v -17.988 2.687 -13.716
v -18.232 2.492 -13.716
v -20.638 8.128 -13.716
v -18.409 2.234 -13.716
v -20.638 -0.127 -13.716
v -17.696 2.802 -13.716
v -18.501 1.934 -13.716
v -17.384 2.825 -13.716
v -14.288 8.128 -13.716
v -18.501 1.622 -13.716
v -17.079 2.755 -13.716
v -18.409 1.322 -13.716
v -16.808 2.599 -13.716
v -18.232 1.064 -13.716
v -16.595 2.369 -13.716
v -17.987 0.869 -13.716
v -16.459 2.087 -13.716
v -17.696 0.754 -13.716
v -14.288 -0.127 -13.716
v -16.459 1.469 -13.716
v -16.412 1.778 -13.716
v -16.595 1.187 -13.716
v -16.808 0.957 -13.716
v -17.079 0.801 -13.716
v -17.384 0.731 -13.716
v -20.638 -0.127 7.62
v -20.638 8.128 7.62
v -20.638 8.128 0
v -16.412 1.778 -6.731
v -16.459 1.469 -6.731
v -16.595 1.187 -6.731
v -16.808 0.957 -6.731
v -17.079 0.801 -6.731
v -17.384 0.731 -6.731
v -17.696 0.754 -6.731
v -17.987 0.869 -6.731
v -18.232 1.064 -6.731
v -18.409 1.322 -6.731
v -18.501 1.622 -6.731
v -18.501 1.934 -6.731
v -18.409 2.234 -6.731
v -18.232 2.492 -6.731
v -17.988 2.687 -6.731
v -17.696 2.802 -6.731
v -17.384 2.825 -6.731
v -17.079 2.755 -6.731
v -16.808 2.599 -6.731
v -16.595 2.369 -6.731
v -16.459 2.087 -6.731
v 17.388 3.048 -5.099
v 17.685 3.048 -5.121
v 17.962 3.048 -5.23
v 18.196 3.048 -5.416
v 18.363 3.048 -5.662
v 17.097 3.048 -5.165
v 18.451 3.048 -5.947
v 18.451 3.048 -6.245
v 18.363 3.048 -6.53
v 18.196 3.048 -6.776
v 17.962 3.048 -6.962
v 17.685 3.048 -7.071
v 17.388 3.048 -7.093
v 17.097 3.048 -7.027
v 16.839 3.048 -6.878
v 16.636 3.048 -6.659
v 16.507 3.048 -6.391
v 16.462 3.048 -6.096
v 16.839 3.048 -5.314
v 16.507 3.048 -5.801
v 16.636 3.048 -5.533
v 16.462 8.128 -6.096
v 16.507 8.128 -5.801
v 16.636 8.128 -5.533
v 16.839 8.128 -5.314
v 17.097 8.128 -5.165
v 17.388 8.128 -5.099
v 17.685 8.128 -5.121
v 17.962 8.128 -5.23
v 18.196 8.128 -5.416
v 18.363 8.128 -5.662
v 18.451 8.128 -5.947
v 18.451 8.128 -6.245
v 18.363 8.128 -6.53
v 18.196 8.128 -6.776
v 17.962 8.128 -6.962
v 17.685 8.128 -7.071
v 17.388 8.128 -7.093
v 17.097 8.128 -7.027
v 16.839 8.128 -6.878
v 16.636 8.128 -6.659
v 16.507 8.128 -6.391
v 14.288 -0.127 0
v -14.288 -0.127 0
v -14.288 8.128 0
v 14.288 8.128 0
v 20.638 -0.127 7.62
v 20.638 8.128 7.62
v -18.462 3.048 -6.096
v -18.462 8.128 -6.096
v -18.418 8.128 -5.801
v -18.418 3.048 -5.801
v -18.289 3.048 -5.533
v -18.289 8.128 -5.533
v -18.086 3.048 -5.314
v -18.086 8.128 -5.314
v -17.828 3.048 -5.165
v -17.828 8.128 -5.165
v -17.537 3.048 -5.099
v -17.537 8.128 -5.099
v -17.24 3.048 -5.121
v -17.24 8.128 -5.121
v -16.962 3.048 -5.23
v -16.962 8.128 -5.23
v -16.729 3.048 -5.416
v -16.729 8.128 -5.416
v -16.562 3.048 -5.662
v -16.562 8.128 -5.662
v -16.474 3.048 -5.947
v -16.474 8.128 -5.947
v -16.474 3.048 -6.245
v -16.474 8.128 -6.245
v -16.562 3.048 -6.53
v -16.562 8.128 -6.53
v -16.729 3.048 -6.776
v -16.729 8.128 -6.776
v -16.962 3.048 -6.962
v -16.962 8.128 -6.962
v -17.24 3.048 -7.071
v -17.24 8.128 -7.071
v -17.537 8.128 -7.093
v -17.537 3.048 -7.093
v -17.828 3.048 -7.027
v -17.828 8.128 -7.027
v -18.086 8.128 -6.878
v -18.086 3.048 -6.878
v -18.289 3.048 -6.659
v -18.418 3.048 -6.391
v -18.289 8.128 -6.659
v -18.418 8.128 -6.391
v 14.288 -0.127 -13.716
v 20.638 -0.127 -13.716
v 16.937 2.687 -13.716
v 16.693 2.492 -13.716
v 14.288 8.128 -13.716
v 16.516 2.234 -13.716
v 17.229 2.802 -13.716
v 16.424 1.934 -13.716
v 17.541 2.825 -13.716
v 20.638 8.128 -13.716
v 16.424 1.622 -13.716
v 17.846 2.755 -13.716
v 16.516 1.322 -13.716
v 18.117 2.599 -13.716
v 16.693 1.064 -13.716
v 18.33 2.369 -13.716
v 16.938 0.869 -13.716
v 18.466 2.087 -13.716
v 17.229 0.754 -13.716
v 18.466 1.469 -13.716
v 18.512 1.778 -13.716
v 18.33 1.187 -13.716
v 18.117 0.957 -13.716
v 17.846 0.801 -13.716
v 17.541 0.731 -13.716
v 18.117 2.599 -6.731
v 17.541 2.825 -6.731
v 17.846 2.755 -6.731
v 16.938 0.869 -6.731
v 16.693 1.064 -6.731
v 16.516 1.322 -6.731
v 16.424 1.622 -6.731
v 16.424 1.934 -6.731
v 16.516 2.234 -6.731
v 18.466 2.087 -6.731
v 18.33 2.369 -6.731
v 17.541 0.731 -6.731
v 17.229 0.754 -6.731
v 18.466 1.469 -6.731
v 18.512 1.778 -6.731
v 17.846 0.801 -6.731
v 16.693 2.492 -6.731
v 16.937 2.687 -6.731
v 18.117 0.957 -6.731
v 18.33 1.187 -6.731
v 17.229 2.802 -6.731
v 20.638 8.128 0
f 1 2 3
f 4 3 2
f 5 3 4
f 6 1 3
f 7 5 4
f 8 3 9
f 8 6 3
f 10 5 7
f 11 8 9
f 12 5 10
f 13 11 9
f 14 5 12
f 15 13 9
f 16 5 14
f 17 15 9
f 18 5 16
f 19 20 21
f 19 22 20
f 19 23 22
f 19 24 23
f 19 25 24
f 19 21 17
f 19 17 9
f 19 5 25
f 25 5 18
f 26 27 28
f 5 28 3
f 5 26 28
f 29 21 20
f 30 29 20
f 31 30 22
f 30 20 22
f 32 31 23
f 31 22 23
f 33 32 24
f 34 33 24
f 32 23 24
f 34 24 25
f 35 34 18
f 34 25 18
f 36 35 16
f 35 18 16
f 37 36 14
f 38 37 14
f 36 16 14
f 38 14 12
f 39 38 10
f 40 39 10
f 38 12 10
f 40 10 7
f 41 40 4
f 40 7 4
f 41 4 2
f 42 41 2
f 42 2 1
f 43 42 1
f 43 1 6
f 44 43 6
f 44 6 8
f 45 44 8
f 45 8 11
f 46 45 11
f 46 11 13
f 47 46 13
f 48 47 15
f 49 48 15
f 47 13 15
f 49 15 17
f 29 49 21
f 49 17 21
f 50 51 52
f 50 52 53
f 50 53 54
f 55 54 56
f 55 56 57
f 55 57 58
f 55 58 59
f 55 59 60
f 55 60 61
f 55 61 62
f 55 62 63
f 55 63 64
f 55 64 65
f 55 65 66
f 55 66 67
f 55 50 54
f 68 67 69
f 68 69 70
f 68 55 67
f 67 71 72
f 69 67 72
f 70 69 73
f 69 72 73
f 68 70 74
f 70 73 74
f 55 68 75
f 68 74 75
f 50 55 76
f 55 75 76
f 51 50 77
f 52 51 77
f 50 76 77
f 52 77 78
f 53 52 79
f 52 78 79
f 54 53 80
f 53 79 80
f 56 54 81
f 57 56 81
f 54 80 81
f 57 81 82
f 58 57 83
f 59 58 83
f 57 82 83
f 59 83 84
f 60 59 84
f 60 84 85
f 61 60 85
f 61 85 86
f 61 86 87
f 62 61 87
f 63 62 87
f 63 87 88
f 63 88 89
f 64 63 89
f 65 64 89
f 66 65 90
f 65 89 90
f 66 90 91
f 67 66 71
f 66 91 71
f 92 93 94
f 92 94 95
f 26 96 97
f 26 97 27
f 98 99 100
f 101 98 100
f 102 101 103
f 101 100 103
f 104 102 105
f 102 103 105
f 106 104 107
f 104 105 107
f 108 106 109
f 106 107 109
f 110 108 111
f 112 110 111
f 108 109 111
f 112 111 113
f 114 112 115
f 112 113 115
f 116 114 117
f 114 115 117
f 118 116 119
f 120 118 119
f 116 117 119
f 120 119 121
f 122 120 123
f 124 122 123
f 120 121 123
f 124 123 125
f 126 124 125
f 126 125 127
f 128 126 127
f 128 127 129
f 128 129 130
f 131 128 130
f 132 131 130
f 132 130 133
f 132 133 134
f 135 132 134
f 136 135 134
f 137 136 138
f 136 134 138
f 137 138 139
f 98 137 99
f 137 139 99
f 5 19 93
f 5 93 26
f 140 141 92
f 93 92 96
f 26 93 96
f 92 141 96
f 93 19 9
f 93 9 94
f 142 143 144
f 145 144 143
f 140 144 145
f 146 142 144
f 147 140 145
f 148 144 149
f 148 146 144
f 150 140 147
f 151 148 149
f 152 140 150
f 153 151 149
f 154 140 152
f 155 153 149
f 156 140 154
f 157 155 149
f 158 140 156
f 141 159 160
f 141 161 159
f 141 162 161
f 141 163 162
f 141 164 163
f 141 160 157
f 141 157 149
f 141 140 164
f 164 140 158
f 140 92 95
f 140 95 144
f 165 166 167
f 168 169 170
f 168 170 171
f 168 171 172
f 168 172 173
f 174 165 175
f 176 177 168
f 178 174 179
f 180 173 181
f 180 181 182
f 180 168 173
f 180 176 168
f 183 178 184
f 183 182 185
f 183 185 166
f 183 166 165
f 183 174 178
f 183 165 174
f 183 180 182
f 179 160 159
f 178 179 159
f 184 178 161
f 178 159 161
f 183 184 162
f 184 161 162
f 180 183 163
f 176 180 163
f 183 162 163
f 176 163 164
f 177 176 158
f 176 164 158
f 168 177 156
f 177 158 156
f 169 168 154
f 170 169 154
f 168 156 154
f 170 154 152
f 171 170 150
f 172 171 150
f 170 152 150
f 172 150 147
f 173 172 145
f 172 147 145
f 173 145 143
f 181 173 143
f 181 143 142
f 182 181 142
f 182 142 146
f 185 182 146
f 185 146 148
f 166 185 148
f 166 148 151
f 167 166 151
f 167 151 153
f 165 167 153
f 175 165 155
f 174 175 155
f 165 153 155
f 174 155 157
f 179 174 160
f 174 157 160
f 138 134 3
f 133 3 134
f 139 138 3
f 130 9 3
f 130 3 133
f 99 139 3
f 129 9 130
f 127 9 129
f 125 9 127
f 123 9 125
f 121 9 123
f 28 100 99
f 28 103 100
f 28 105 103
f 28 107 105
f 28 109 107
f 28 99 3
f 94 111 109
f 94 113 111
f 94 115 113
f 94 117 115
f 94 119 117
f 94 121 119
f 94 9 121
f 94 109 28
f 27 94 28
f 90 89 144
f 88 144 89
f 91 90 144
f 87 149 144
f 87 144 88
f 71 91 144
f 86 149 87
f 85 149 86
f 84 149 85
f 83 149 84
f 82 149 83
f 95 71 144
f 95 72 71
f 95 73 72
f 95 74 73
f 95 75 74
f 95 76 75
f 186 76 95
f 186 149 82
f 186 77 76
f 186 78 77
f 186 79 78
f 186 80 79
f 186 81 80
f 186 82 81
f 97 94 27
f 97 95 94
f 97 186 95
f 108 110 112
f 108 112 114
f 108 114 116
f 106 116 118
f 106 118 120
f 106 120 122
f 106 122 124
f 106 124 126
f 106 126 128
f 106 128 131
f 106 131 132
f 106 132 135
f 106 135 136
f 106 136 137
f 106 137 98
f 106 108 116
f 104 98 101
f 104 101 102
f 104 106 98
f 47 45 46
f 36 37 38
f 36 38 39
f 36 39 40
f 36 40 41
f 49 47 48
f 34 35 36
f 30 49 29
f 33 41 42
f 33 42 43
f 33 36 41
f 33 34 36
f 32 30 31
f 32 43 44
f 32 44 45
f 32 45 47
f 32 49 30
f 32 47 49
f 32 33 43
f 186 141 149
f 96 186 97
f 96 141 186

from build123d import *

# Parameters (mm, degrees)
F1_DEPTH      = 10.668
F2_W          = 2.54
F2_H          = 13.716
F2_W_2        = 10.541
F3_DEPTH      = 20.6385
F3_DEPTH_BACK = 20.6385
F4_R          = 1
F5_DEPTH      = 5.08
F6_R          = 1.05
F7_DEPTH      = 6.985
F8_W          = 11.4453516792
F8_H          = 8.6245518178
F8_W_2        = 4.2650750415
F9_DEPTH      = 20.6385
F9_DEPTH_BACK = 20.6385


with BuildPart() as f1:
    # F0 (on Front) → F1 (new body, symmetric)
    with BuildSketch(Plane.XZ):
        Polygon((-14.2875, 0), (0, 0), (14.2875, 0), (14.2875, -13.716), (20.6375, -13.716), (20.6375, 7.62), (0, 7.62), (-20.6375, 7.62), (-20.6375, -13.716), (-14.2875, -13.716), align=None)
    extrude(amount=F1_DEPTH, both=True)

    # F2 (on Right) → F3 (cut, two sides)
    with BuildSketch(Plane.YZ) as f3_sk:
        with Locations((9.398, -6.858)):
            Rectangle(F2_W, F2_H)
        with Locations((-5.3975, -6.858)):
            Rectangle(F2_W_2, F2_H)
    extrude(amount=-F3_DEPTH, mode=Mode.SUBTRACT)
    extrude(f3_sk.sketch, amount=F3_DEPTH_BACK, mode=Mode.SUBTRACT)

    # F4 (on face) → F5 (cut)
    with BuildSketch(Plane(origin=(0, 8.128, 0), x_dir=(-1, 0, 0), z_dir=(0, 1, 0))):
        with Locations((-17.4625, -6.096)):
            Circle(F4_R)
        with Locations((17.4625, -6.096)):
            Circle(F4_R)
    extrude(amount=-F5_DEPTH, mode=Mode.SUBTRACT)

    # F6 (on face) → F7 (cut)
    with BuildSketch(Plane(origin=(0, 0, -13.716), x_dir=(1, 0, 0), z_dir=(0, 0, -1))):
        with Locations((-17.4625, -1.778)):
            Circle(F6_R)
        with Locations((17.4625, -1.778)):
            Circle(F6_R)
    extrude(amount=-F7_DEPTH, mode=Mode.SUBTRACT)

    # F8 (on Right) → F9 (cut, two sides)
    with BuildSketch(Plane.YZ) as f9_sk:
        with Locations((-5.8496758396, 4.3122759089)):
            Rectangle(F8_W, F8_H)
        with Locations((10.2605375207, 4.3122759089)):
            Rectangle(F8_W_2, F8_H)
    extrude(amount=F9_DEPTH, mode=Mode.SUBTRACT)
    extrude(f9_sk.sketch, amount=-F9_DEPTH_BACK, mode=Mode.SUBTRACT)


solid = f1.part
